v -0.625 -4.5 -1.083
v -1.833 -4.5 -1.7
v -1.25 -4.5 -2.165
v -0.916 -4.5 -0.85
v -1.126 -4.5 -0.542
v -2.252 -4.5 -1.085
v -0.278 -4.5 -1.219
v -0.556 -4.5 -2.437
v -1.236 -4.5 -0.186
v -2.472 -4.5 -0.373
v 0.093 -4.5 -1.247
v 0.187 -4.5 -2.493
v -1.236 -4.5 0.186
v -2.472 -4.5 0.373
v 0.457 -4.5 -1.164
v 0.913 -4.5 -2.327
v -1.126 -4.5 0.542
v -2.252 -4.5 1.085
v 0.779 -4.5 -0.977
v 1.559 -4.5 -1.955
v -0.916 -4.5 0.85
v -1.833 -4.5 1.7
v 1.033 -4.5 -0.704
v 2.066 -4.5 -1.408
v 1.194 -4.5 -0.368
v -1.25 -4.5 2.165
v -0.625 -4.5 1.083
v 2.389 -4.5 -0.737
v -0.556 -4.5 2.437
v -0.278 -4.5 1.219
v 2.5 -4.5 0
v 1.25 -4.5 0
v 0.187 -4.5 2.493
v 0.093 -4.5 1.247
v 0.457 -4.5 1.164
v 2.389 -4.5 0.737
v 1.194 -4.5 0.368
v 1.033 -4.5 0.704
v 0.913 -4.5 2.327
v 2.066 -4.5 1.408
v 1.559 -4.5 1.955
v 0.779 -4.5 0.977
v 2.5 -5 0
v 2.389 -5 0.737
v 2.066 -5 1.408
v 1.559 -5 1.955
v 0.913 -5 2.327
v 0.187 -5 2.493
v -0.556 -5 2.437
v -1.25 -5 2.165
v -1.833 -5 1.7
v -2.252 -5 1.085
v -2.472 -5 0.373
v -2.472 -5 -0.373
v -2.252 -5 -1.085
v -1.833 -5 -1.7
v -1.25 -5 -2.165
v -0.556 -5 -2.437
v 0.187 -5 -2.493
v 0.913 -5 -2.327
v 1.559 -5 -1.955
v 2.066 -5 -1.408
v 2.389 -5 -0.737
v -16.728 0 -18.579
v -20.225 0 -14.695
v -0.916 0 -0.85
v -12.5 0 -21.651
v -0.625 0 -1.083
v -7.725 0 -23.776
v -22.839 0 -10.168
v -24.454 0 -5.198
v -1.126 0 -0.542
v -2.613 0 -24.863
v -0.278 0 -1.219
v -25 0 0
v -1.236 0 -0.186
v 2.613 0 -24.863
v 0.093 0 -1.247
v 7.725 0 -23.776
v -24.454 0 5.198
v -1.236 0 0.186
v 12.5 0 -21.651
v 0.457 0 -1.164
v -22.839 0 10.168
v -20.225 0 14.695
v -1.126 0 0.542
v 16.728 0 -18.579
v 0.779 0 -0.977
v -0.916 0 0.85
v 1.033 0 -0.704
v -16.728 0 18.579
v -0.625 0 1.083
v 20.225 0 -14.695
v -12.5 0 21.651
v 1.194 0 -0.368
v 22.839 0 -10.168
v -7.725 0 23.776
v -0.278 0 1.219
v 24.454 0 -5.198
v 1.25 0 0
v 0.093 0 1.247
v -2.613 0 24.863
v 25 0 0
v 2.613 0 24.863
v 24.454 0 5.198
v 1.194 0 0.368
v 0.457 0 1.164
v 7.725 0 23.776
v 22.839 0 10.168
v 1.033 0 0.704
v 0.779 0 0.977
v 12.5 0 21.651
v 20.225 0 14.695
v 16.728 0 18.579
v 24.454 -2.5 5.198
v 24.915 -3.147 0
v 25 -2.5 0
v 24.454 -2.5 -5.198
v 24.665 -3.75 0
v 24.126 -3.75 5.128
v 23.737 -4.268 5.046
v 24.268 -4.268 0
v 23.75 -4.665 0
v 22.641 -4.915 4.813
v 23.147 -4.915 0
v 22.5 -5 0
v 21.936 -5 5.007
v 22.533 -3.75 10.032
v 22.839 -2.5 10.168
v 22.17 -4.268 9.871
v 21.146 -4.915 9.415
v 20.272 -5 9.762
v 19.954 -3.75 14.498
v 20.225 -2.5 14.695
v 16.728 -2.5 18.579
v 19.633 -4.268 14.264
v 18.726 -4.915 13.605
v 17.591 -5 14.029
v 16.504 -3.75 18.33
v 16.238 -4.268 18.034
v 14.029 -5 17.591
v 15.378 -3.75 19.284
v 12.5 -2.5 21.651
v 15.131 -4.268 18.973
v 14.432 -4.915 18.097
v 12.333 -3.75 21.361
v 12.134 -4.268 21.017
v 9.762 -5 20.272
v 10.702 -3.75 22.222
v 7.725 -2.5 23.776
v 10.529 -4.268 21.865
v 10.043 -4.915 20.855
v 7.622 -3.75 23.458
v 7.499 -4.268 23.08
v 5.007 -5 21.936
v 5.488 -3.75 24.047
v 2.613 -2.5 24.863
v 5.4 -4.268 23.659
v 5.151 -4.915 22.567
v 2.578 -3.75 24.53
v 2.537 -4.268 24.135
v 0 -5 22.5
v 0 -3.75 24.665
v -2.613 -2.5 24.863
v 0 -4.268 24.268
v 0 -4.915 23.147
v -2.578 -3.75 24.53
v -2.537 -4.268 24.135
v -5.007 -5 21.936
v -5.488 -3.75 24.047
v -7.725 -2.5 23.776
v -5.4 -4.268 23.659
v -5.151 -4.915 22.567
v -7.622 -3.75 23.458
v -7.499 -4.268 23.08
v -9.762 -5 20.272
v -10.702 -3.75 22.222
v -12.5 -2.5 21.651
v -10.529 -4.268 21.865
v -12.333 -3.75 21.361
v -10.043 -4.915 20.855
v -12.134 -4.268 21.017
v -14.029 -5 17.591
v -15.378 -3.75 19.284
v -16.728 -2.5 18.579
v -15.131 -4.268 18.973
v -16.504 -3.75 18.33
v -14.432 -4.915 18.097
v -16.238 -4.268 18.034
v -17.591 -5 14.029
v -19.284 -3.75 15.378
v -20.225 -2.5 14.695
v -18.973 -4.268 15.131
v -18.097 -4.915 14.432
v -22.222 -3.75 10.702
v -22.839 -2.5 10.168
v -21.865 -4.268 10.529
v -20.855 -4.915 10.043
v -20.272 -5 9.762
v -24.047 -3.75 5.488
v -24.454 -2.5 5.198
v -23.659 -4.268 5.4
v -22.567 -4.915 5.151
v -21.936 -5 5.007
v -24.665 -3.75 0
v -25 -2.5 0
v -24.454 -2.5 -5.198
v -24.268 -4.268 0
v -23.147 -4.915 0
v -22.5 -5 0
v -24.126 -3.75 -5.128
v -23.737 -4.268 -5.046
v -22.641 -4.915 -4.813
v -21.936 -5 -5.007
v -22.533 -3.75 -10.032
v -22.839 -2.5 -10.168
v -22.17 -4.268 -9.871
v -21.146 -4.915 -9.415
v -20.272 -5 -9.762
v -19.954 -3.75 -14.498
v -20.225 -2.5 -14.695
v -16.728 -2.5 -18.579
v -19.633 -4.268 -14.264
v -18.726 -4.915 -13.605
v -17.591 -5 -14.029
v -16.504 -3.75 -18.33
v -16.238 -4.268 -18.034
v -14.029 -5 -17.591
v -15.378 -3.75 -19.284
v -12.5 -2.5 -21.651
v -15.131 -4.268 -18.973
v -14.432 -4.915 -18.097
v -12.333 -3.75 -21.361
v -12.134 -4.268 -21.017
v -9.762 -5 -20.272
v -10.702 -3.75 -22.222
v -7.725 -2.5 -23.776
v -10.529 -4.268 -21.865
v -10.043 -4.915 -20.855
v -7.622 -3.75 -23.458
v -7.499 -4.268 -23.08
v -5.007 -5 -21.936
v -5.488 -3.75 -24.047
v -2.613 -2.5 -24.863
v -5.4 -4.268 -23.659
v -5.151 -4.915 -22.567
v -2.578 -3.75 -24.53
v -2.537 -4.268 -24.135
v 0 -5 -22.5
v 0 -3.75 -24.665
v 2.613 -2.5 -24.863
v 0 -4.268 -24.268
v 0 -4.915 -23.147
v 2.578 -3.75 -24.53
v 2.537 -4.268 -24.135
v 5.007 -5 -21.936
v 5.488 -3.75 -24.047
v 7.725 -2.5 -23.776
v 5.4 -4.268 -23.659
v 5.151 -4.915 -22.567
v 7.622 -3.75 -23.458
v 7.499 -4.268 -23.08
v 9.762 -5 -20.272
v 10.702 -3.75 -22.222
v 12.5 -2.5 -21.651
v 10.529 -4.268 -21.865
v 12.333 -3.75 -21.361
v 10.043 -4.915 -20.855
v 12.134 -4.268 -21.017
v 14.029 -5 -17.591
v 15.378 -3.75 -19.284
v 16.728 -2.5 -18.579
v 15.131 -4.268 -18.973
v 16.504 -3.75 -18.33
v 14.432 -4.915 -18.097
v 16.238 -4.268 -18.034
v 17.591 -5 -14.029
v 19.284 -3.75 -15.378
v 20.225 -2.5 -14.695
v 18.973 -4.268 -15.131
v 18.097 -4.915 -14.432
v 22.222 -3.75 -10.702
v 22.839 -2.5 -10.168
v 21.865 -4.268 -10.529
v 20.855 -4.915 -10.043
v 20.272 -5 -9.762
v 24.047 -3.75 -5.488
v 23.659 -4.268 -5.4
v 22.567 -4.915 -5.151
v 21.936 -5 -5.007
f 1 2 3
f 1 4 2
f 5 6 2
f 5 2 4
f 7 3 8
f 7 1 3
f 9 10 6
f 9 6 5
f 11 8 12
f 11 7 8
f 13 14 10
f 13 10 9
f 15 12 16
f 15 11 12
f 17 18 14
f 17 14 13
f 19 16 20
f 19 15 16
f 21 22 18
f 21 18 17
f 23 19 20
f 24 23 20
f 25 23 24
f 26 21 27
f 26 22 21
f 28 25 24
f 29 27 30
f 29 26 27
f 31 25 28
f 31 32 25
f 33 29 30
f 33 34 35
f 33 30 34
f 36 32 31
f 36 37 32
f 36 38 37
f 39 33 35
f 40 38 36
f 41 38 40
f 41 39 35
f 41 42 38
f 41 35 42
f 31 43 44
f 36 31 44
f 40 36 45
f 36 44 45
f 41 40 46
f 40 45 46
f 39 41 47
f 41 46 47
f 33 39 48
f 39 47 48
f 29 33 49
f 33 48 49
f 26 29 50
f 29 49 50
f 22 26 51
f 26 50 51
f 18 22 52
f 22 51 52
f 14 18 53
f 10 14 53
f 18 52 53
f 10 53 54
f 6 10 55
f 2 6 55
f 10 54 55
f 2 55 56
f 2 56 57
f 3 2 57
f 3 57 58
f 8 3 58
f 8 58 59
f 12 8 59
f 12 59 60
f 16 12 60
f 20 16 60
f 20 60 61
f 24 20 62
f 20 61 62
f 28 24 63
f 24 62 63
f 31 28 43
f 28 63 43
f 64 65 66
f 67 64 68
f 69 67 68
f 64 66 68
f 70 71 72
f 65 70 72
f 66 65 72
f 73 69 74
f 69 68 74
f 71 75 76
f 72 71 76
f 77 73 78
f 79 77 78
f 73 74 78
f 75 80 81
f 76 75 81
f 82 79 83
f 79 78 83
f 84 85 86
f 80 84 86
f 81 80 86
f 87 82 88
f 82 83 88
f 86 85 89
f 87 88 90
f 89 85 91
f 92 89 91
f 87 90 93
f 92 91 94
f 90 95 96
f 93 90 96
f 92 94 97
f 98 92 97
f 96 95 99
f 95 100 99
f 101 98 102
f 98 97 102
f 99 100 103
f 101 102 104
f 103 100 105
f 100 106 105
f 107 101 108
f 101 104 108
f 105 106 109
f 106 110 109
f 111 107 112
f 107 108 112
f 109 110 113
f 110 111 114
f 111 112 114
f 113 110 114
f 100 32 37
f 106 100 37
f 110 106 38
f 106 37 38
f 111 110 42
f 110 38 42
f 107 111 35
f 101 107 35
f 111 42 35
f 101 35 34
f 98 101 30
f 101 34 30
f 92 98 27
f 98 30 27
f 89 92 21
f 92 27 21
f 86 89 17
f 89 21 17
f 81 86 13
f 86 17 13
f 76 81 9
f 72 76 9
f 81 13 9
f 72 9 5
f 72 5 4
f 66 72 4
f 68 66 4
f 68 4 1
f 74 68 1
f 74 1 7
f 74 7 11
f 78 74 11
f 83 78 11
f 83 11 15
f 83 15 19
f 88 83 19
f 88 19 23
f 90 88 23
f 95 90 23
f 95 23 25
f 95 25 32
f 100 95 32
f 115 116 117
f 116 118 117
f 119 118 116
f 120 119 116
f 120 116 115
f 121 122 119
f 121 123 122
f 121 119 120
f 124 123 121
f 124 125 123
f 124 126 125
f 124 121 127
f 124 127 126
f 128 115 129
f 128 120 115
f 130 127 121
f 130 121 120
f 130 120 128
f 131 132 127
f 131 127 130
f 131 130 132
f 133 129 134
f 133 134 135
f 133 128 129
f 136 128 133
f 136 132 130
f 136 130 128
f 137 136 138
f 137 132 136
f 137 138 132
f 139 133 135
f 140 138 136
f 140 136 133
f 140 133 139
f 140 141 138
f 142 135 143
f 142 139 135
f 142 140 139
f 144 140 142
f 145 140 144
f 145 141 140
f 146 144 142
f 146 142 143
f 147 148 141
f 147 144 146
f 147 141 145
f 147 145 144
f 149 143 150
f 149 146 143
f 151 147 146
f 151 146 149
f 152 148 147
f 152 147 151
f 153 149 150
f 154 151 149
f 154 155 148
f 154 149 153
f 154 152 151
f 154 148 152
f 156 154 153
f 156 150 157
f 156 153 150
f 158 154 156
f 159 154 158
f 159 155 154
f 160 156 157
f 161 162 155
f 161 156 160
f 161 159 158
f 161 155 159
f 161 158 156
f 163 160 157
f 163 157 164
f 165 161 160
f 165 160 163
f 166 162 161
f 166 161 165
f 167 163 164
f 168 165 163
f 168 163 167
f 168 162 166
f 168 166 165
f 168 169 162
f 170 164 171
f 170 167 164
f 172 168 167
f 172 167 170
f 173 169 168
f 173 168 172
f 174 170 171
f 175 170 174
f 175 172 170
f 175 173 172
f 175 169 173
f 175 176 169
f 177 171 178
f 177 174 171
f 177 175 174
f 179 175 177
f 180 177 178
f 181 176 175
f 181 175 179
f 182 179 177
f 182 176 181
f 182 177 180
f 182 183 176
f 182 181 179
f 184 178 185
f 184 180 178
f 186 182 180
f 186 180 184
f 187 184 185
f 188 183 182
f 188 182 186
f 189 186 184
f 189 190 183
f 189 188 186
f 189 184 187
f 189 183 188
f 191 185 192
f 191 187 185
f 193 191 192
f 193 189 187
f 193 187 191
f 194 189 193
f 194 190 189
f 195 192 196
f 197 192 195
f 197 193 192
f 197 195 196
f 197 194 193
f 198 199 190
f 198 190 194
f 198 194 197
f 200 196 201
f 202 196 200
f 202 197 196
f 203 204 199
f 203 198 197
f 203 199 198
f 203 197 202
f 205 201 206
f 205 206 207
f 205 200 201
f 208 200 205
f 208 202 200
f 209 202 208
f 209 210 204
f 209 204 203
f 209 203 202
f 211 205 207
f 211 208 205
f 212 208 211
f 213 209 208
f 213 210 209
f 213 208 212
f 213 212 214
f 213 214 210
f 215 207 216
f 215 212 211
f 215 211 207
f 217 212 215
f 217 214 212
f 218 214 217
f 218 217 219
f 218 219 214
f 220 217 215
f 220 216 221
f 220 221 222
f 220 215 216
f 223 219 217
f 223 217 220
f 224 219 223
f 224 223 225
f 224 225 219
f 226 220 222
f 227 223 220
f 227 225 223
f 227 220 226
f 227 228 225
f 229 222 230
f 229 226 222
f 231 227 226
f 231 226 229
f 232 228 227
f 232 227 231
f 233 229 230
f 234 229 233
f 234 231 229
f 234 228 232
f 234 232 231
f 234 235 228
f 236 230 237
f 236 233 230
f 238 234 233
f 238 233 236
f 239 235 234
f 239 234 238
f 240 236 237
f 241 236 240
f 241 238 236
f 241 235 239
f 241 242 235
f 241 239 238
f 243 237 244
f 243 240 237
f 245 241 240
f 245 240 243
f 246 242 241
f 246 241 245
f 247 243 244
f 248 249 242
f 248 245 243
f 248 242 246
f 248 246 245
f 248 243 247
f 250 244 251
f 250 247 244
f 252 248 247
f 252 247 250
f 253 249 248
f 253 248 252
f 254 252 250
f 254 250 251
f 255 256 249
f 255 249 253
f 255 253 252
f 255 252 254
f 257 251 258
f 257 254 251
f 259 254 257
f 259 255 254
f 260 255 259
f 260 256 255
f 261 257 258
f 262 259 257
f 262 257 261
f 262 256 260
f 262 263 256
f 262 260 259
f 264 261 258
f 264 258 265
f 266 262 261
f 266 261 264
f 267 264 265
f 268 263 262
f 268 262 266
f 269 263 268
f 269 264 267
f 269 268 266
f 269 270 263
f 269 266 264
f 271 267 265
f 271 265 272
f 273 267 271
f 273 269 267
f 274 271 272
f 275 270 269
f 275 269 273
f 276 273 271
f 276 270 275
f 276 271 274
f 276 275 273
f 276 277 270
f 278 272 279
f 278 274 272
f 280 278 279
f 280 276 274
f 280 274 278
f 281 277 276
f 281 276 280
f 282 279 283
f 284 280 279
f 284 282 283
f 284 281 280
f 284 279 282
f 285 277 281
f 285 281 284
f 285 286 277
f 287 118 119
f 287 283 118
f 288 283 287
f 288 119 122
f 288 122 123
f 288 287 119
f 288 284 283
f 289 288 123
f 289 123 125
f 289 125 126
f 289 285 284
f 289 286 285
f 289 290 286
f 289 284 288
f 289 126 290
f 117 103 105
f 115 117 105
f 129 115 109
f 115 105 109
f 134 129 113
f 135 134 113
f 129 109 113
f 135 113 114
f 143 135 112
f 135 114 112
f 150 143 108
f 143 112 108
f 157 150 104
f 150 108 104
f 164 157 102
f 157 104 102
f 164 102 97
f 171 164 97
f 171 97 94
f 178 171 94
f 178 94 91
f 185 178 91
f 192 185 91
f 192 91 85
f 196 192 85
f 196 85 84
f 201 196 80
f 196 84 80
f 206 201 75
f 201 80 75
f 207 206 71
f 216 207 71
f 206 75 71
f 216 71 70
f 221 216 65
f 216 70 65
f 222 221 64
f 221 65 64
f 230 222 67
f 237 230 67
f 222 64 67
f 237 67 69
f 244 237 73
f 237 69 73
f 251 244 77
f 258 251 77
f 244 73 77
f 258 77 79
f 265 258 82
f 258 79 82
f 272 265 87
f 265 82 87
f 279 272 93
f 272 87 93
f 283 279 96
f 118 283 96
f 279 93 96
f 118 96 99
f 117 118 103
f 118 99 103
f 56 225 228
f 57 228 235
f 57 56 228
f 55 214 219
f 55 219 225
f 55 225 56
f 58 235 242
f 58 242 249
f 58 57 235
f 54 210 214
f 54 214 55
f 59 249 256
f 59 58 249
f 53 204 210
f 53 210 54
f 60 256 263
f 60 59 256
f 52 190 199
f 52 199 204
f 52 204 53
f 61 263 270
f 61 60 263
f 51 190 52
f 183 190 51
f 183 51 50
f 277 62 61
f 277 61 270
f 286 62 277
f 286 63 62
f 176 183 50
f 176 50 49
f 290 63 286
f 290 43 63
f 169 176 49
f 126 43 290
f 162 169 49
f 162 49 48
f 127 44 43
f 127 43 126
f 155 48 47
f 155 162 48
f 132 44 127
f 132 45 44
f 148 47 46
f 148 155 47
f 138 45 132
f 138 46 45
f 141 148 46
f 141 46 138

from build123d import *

# Parameters (mm, degrees)
F0_R      = 25
F1_DEPTH  = 5
F2_R      = 2.5
F3_R      = 2.5
F3_R_2    = 1.25
F4_DEPTH  = 0.5
F4_FACE_R = 1.25
F5_DEPTH  = 32.62


with BuildPart() as f1:
    # F0 (on Front) → F1 (new body)
    with BuildSketch(Plane.XZ):
        Circle(F0_R)
    extrude(amount=F1_DEPTH)

    # F2
    f2_edges = [f1.edges().sort_by_distance(p)[0] for p in [
        (-25, -5, 0),
    ]]
    fillet(f2_edges, radius=F2_R)

    # F3 (on face) → F4 (cut)
    with BuildSketch(Plane.XZ.offset(5)):
        Circle(F3_R)
        Circle(F3_R_2, mode=Mode.SUBTRACT)
    extrude(amount=-F4_DEPTH, mode=Mode.SUBTRACT)

    # F4_face (on face) → F5 (cut)
    with BuildSketch(Plane.XZ.offset(5)):
        Circle(F4_FACE_R)
    extrude(amount=-F5_DEPTH, mode=Mode.SUBTRACT)


solid = f1.part
